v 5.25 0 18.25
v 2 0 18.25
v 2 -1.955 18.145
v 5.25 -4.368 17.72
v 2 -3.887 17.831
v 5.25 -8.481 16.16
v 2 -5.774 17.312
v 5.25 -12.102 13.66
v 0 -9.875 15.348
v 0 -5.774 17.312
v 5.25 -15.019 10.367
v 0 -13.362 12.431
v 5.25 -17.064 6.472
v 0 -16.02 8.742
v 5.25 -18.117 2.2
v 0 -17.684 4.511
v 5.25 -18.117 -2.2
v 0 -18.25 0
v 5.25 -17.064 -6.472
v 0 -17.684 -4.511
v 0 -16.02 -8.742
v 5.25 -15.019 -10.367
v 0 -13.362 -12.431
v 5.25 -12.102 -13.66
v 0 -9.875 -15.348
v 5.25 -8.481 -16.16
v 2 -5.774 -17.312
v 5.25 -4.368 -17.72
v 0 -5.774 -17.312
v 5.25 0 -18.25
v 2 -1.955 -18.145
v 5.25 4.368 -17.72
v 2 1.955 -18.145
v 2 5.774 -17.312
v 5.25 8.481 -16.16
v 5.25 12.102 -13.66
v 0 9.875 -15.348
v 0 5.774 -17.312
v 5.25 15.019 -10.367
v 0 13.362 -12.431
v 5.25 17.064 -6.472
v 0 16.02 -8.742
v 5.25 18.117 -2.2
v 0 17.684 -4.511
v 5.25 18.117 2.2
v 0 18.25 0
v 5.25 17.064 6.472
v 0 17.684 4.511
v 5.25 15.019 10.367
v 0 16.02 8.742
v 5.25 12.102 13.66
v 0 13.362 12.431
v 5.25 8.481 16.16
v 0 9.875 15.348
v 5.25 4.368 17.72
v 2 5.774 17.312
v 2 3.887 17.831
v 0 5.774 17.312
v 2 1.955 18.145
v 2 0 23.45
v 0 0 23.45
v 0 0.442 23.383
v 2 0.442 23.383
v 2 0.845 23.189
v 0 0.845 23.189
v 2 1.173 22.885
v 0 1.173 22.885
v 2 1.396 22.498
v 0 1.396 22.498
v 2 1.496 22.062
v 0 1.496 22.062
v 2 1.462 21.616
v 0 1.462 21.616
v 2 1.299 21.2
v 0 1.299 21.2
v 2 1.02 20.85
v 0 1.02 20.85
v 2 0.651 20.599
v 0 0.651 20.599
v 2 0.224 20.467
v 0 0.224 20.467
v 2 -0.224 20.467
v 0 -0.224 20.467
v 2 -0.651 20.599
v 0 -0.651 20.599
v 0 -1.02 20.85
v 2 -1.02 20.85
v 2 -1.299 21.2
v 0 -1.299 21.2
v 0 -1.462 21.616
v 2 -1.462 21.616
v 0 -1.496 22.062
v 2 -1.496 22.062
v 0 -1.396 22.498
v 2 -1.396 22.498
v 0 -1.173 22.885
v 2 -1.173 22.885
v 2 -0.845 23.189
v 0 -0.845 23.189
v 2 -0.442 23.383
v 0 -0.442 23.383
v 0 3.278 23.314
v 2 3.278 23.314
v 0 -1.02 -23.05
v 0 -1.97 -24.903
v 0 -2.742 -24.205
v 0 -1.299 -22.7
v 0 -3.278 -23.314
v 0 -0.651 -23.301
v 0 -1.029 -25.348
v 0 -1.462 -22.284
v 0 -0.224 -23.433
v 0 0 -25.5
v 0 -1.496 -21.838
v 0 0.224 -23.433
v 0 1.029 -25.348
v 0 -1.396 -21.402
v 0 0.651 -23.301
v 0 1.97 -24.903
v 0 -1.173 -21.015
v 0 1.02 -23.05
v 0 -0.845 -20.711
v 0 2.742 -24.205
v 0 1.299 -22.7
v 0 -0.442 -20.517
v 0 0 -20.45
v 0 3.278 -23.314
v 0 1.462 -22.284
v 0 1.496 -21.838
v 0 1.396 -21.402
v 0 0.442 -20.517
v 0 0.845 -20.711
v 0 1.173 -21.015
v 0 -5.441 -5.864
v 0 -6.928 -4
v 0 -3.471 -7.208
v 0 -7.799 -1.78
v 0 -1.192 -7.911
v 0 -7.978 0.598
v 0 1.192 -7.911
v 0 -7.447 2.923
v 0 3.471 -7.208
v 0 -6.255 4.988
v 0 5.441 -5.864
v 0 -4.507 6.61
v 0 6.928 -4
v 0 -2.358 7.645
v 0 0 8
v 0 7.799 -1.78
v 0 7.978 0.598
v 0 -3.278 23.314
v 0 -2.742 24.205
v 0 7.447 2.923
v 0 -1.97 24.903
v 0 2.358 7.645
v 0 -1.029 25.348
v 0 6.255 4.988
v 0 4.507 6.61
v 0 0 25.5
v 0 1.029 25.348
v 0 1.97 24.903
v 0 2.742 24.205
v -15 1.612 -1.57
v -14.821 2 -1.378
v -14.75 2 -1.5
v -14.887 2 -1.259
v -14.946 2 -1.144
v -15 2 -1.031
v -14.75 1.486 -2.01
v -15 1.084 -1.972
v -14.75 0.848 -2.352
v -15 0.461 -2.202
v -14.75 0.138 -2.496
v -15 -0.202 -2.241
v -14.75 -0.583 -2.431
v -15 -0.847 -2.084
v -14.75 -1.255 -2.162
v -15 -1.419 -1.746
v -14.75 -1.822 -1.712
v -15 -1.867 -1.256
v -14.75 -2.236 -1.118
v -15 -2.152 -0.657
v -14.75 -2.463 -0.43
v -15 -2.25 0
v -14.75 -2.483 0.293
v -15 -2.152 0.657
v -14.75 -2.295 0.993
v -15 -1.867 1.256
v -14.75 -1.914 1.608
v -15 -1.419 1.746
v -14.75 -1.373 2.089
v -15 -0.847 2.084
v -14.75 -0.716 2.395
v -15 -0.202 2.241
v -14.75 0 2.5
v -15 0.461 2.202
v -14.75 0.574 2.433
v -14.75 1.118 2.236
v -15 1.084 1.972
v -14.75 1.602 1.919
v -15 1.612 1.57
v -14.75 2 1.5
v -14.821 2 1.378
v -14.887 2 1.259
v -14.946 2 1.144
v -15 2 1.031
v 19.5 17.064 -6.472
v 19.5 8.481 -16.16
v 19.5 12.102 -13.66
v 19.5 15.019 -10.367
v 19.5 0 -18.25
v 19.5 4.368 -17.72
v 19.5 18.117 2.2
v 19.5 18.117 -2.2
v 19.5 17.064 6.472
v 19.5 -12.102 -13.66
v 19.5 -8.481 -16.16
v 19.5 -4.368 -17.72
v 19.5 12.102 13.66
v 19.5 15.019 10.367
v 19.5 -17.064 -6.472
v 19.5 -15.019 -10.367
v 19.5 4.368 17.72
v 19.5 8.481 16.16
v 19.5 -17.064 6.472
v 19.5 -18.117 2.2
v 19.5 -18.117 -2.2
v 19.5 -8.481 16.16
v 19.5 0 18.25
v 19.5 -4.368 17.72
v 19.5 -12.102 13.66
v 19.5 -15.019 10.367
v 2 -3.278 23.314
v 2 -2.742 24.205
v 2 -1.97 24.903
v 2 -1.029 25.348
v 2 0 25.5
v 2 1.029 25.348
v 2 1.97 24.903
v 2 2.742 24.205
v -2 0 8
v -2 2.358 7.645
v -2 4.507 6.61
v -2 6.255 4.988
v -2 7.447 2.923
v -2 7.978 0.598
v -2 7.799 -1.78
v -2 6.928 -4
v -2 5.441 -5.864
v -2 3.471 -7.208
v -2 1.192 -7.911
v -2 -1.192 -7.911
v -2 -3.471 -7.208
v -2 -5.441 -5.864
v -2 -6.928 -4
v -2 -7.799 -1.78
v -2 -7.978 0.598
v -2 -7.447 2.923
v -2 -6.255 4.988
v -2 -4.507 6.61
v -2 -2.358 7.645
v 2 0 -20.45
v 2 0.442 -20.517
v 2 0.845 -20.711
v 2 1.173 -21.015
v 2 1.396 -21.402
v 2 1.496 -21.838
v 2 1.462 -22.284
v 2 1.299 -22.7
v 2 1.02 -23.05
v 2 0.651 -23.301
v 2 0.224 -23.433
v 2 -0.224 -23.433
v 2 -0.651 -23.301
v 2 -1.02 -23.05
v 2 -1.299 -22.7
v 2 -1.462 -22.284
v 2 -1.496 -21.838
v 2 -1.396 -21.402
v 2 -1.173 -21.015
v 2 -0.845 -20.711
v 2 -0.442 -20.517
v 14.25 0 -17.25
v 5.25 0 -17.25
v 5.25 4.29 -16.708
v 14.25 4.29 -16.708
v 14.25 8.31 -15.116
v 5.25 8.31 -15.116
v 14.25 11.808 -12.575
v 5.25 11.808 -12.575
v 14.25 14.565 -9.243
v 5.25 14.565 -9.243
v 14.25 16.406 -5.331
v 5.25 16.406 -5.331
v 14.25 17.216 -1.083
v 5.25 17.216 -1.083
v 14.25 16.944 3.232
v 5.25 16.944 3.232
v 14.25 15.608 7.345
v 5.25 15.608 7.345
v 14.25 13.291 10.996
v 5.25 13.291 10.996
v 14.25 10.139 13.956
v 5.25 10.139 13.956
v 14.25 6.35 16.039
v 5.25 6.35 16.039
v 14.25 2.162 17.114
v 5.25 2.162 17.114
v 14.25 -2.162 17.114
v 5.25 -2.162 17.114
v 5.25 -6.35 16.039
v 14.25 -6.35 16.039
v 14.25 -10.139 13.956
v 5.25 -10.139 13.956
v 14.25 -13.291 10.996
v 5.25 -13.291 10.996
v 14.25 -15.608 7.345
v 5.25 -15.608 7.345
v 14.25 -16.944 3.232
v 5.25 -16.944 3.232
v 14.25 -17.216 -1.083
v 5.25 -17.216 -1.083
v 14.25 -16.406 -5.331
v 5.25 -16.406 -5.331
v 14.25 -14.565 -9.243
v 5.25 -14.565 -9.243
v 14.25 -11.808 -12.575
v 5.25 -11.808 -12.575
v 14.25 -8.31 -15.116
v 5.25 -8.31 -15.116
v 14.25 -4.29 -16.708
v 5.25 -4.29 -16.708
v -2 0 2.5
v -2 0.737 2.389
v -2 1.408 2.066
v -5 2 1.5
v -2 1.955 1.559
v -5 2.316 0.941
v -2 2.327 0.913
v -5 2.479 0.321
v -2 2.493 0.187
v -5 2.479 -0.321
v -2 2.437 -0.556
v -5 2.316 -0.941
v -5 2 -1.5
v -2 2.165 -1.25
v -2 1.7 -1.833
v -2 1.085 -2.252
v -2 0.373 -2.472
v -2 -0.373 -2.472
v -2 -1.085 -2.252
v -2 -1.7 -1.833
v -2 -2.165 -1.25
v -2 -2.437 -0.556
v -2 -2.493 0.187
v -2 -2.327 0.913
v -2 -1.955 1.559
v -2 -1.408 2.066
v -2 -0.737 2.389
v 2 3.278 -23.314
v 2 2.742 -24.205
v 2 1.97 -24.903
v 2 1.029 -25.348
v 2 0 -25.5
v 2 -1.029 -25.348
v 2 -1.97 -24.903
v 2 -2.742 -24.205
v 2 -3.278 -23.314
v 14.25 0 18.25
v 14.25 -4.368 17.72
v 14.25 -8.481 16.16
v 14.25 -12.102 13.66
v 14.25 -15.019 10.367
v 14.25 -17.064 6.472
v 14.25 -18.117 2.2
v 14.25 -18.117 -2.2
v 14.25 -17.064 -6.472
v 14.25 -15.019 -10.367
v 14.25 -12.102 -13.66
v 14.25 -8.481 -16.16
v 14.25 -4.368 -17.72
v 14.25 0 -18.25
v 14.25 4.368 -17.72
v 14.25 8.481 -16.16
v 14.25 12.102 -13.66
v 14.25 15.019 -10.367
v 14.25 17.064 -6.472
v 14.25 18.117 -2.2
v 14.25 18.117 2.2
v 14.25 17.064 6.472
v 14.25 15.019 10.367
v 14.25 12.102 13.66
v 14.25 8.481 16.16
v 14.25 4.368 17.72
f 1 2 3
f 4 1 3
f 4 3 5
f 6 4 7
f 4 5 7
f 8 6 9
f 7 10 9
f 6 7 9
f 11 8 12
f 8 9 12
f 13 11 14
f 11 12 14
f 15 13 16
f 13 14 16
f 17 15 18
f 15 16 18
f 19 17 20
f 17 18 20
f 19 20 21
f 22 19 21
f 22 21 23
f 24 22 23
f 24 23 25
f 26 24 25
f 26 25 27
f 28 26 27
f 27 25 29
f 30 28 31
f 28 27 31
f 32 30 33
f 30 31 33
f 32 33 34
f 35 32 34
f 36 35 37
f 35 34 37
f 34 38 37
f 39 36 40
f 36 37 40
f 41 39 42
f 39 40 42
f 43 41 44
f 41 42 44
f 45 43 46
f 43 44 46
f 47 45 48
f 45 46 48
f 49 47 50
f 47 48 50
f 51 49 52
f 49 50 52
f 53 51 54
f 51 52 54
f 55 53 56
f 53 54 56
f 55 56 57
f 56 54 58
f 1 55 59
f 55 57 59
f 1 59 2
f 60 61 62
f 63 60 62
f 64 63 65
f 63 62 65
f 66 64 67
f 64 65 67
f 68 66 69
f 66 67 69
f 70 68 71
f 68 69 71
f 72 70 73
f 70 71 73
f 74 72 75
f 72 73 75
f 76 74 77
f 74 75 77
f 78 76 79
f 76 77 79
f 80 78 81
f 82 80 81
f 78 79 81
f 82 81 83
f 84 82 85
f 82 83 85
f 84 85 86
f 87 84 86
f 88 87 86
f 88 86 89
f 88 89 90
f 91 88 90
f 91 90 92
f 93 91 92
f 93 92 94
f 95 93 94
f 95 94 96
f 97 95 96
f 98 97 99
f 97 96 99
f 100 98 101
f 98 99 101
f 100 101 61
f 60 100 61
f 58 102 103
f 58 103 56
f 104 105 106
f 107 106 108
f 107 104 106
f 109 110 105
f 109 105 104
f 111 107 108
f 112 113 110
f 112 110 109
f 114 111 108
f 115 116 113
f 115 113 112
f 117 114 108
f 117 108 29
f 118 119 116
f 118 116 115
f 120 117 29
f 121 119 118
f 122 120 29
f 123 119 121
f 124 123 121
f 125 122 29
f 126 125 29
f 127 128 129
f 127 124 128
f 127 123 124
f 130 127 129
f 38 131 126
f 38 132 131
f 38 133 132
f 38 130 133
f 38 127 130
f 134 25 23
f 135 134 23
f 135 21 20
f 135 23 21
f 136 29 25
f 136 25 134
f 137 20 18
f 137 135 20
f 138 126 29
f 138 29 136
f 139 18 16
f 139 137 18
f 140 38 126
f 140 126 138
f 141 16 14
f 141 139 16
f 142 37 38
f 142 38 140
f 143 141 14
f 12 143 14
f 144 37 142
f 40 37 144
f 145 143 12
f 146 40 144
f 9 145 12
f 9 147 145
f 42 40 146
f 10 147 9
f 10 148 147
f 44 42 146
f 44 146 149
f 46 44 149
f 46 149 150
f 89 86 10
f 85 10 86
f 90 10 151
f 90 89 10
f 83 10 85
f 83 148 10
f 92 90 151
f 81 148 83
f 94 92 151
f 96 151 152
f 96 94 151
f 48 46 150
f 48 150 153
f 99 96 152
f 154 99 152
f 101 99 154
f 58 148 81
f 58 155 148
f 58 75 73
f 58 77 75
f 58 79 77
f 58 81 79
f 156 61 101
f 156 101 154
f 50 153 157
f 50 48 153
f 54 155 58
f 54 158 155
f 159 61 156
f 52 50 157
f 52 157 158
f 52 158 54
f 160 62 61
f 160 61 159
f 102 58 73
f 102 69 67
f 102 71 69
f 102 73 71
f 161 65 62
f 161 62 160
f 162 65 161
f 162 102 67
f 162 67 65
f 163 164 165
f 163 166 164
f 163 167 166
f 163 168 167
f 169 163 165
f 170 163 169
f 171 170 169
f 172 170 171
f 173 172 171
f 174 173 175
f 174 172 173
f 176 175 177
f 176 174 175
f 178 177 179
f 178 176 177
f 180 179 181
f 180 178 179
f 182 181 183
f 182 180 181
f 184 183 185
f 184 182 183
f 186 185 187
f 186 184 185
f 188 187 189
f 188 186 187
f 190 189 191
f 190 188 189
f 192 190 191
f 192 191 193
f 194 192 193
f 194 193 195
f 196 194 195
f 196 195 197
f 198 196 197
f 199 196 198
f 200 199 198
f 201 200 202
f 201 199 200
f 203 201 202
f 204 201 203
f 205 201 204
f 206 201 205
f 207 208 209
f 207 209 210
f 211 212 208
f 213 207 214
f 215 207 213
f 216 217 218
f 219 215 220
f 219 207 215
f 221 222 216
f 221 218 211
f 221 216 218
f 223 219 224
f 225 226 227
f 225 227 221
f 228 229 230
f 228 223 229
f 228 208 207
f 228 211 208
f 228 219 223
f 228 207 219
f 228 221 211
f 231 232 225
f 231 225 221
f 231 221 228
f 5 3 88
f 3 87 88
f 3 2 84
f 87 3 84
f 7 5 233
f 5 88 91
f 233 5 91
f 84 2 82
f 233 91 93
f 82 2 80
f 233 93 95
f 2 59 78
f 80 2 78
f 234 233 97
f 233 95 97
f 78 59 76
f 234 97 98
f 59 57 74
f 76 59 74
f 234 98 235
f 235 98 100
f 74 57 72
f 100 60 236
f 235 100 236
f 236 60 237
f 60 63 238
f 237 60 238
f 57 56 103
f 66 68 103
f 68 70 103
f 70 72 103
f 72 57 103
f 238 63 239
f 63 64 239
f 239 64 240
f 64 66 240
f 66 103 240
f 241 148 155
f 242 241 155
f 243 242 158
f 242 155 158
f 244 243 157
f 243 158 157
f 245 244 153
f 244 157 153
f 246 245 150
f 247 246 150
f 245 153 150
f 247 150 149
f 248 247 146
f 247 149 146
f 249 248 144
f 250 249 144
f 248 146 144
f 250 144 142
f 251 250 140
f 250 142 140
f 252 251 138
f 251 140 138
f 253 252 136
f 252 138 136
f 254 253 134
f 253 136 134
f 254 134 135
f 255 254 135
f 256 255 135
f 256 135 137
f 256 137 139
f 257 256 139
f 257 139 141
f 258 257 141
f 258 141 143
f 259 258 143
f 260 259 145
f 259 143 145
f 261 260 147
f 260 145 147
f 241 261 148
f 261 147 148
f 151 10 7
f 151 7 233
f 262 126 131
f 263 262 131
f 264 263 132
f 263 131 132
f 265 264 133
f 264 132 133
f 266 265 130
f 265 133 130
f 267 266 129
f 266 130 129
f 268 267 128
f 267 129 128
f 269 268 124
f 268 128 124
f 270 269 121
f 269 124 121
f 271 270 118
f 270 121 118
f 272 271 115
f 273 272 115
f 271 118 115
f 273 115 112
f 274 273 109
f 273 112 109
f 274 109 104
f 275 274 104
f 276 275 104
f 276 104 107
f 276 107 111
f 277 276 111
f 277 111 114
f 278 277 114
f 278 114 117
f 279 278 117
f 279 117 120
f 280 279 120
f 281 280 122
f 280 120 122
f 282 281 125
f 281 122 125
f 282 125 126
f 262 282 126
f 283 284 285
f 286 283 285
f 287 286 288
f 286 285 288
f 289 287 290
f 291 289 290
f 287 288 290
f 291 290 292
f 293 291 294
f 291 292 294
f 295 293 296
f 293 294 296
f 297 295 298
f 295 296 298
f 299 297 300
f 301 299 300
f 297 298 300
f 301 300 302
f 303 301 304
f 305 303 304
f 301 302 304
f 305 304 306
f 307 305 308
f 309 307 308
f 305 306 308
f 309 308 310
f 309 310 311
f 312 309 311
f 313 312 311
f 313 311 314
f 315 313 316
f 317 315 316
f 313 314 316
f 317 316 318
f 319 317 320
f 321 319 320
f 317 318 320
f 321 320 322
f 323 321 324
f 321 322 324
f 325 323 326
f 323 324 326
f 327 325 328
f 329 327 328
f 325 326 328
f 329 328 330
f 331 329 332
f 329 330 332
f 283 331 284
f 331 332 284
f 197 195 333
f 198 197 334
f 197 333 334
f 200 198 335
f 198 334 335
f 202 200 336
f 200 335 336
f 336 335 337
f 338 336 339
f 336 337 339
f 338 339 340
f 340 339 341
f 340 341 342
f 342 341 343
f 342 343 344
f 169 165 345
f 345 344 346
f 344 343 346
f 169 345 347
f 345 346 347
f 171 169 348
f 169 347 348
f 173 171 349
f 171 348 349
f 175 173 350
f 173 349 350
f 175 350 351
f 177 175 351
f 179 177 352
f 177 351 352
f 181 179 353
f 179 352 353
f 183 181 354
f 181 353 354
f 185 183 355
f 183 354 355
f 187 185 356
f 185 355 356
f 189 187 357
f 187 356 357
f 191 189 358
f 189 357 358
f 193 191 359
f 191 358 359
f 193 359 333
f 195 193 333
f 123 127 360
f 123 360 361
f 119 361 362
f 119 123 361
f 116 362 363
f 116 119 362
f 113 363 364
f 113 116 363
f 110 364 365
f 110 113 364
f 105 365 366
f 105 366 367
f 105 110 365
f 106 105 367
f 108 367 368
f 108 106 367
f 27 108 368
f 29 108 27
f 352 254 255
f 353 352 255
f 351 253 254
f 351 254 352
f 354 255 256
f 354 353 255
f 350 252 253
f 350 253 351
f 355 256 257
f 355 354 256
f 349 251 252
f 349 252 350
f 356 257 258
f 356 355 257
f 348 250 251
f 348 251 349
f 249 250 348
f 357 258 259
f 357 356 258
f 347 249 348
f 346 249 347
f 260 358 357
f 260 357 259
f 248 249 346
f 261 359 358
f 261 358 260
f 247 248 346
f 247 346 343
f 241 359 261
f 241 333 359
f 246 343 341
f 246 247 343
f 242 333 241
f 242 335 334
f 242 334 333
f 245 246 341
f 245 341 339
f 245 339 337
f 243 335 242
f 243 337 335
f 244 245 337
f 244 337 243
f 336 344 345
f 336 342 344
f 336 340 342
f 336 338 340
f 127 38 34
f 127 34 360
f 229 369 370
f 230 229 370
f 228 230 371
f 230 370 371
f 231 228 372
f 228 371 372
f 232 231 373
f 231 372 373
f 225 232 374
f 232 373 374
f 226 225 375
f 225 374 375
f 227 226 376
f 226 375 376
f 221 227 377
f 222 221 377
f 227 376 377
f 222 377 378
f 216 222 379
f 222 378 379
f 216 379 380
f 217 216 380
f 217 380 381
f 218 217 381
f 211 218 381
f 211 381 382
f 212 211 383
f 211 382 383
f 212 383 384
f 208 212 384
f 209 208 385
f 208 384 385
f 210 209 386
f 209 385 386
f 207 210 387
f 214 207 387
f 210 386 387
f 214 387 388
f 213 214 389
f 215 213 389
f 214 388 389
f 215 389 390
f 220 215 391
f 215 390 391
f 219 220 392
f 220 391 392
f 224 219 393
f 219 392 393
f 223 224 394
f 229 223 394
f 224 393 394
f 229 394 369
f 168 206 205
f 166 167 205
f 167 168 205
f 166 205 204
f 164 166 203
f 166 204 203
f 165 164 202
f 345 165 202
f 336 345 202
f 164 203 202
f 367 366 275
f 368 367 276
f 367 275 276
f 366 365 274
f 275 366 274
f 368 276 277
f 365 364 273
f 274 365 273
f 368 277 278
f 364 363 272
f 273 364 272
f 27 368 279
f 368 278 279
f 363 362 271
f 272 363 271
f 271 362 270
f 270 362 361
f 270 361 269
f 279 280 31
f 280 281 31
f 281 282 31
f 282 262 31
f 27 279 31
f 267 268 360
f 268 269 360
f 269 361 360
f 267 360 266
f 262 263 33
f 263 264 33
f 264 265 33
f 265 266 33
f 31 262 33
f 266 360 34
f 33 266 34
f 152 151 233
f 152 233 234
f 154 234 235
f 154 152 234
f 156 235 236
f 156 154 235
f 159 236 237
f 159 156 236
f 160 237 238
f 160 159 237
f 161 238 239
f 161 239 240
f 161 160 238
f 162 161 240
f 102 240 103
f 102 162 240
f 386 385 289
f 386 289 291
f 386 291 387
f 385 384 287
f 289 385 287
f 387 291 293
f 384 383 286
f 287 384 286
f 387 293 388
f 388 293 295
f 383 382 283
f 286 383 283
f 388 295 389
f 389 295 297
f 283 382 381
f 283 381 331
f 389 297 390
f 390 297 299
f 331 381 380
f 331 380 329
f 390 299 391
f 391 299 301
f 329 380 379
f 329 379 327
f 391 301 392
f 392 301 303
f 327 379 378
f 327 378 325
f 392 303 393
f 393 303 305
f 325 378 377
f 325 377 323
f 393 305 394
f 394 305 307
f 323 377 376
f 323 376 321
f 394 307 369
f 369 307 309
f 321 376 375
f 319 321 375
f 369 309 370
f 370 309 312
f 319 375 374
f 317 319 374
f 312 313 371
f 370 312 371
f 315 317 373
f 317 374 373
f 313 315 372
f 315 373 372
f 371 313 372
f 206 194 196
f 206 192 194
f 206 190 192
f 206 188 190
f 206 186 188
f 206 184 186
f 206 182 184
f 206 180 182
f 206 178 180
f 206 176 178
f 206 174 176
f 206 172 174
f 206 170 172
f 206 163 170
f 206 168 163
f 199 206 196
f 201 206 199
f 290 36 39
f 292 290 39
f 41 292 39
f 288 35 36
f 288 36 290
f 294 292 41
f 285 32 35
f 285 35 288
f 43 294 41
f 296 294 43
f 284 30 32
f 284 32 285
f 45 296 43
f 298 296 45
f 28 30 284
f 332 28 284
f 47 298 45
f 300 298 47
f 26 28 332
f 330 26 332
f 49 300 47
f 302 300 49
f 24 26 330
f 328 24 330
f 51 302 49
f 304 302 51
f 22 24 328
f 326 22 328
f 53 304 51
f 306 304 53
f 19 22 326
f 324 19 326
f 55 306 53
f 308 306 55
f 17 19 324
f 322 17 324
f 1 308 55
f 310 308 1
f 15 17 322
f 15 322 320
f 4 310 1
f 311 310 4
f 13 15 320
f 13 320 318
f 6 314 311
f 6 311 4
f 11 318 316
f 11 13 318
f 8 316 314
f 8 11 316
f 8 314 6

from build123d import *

# Parameters (mm, degrees)
ESQUISSE2_R             = 18.25
BOSS_EXTRU_1_DEPTH      = 5.25
ESQUISSE3_R             = 17.25
BOSS_EXTRU_2_DEPTH      = 9
ESQUISSE4_R             = 18.25
BOSS_EXTRU_3_DEPTH      = 5.25
ESQUISSE6_R             = 1.5
BOSS_EXTRU_4_DEPTH      = 2
ESQUISSE7_R             = 8
BOSS_EXTRU_5_DEPTH      = 2
ESQUISSE8_R             = 2.5
BOSS_EXTRU_6_DEPTH      = 15
CHANFREIN1_SIZE         = 0.25
ESQUISSE9_W             = 5
ESQUISSE9_H             = 1
ENL_V_MAT_EXTRU_1_DEPTH = 10


with BuildPart() as part:
    # Esquisse2 → Boss.-Extru.1 (new body)
    with BuildSketch(Plane(origin=(0, 0, 0), x_dir=(0, 0, -1), z_dir=(1, 0, 0))):
        with Locations(Location((0, 0, 0), (0, 0, 180))):
            Circle(ESQUISSE2_R)
    extrude(amount=BOSS_EXTRU_1_DEPTH)

    # Esquisse3 → Boss.-Extru.2 (add)
    with BuildSketch(Plane(origin=(5.25, 0, 0), x_dir=(0, 0, -1), z_dir=(1, 0, 0))):
        Circle(ESQUISSE3_R)
    extrude(amount=BOSS_EXTRU_2_DEPTH)

    # Esquisse4 → Boss.-Extru.3 (add)
    with BuildSketch(Plane(origin=(14.25, 0, 0), x_dir=(0, 0, -1), z_dir=(1, 0, 0))):
        with Locations(Location((0, 0, 0), (0, 0, 180))):
            Circle(ESQUISSE4_R)
    extrude(amount=BOSS_EXTRU_3_DEPTH)

    # Esquisse6 → Boss.-Extru.4 (add)
    # profile 1 of 2: a face of its own
    with BuildSketch(Plane.ZY):
        with BuildLine():
            ThreePointArc((23.313667029, -3.27763821), (25.5, 0), (23.313667029, 3.27763821))
            Line((23.313667029, 3.27763821), (17.312357631, 5.774493333))
            ThreePointArc((17.312357631, 5.774493333), (18.014064322, 2.925061814), (18.25, 0))
            ThreePointArc((18.25, 0), (18.014064322, -2.925061814), (17.312357631, -5.774493333))
            Line((17.312357631, -5.774493333), (23.313667029, -3.27763821))
        make_face()
        with Locations((21.95, 0)):
            Circle(ESQUISSE6_R, mode=Mode.SUBTRACT)
    # profile 2 of 2: a face of its own
    with BuildSketch(Plane.ZY):
        with BuildLine():
            ThreePointArc((-17.312357631, -5.774493333), (-18.25, 0), (-17.312357631, 5.774493333))
            Line((-17.312357631, 5.774493333), (-23.313667029, 3.27763821))
            ThreePointArc((-23.313667029, 3.27763821), (-25.5, 0), (-23.313667029, -3.27763821))
            Line((-23.313667029, -3.27763821), (-17.312357631, -5.774493333))
        make_face()
        with Locations((-21.95, 0)):
            Circle(ESQUISSE6_R, mode=Mode.SUBTRACT)
    extrude(amount=-BOSS_EXTRU_4_DEPTH)

    # Esquisse7 → Boss.-Extru.5 (add)
    with BuildSketch(Plane.ZY):
        Circle(ESQUISSE7_R)
    extrude(amount=BOSS_EXTRU_5_DEPTH)

    # Esquisse8 → Boss.-Extru.6 (add)
    with BuildSketch(Plane.ZY):
        Circle(ESQUISSE8_R)
    extrude(amount=BOSS_EXTRU_6_DEPTH)

    # Chanfrein1
    chanfrein1_edges = [part.edges().sort_by_distance(p)[0] for p in [
        (-15, 0, -2.5),
    ]]
    chamfer(chanfrein1_edges, length=CHANFREIN1_SIZE)

    # Esquisse9 → Enlèv. mat.-Extru.1 (cut)
    with BuildSketch(Plane.ZY.offset(15)):
        with Locations((0, 2.5)):
            Rectangle(ESQUISSE9_W, ESQUISSE9_H)
    extrude(amount=-ENL_V_MAT_EXTRU_1_DEPTH, mode=Mode.SUBTRACT)


solid = part.part
